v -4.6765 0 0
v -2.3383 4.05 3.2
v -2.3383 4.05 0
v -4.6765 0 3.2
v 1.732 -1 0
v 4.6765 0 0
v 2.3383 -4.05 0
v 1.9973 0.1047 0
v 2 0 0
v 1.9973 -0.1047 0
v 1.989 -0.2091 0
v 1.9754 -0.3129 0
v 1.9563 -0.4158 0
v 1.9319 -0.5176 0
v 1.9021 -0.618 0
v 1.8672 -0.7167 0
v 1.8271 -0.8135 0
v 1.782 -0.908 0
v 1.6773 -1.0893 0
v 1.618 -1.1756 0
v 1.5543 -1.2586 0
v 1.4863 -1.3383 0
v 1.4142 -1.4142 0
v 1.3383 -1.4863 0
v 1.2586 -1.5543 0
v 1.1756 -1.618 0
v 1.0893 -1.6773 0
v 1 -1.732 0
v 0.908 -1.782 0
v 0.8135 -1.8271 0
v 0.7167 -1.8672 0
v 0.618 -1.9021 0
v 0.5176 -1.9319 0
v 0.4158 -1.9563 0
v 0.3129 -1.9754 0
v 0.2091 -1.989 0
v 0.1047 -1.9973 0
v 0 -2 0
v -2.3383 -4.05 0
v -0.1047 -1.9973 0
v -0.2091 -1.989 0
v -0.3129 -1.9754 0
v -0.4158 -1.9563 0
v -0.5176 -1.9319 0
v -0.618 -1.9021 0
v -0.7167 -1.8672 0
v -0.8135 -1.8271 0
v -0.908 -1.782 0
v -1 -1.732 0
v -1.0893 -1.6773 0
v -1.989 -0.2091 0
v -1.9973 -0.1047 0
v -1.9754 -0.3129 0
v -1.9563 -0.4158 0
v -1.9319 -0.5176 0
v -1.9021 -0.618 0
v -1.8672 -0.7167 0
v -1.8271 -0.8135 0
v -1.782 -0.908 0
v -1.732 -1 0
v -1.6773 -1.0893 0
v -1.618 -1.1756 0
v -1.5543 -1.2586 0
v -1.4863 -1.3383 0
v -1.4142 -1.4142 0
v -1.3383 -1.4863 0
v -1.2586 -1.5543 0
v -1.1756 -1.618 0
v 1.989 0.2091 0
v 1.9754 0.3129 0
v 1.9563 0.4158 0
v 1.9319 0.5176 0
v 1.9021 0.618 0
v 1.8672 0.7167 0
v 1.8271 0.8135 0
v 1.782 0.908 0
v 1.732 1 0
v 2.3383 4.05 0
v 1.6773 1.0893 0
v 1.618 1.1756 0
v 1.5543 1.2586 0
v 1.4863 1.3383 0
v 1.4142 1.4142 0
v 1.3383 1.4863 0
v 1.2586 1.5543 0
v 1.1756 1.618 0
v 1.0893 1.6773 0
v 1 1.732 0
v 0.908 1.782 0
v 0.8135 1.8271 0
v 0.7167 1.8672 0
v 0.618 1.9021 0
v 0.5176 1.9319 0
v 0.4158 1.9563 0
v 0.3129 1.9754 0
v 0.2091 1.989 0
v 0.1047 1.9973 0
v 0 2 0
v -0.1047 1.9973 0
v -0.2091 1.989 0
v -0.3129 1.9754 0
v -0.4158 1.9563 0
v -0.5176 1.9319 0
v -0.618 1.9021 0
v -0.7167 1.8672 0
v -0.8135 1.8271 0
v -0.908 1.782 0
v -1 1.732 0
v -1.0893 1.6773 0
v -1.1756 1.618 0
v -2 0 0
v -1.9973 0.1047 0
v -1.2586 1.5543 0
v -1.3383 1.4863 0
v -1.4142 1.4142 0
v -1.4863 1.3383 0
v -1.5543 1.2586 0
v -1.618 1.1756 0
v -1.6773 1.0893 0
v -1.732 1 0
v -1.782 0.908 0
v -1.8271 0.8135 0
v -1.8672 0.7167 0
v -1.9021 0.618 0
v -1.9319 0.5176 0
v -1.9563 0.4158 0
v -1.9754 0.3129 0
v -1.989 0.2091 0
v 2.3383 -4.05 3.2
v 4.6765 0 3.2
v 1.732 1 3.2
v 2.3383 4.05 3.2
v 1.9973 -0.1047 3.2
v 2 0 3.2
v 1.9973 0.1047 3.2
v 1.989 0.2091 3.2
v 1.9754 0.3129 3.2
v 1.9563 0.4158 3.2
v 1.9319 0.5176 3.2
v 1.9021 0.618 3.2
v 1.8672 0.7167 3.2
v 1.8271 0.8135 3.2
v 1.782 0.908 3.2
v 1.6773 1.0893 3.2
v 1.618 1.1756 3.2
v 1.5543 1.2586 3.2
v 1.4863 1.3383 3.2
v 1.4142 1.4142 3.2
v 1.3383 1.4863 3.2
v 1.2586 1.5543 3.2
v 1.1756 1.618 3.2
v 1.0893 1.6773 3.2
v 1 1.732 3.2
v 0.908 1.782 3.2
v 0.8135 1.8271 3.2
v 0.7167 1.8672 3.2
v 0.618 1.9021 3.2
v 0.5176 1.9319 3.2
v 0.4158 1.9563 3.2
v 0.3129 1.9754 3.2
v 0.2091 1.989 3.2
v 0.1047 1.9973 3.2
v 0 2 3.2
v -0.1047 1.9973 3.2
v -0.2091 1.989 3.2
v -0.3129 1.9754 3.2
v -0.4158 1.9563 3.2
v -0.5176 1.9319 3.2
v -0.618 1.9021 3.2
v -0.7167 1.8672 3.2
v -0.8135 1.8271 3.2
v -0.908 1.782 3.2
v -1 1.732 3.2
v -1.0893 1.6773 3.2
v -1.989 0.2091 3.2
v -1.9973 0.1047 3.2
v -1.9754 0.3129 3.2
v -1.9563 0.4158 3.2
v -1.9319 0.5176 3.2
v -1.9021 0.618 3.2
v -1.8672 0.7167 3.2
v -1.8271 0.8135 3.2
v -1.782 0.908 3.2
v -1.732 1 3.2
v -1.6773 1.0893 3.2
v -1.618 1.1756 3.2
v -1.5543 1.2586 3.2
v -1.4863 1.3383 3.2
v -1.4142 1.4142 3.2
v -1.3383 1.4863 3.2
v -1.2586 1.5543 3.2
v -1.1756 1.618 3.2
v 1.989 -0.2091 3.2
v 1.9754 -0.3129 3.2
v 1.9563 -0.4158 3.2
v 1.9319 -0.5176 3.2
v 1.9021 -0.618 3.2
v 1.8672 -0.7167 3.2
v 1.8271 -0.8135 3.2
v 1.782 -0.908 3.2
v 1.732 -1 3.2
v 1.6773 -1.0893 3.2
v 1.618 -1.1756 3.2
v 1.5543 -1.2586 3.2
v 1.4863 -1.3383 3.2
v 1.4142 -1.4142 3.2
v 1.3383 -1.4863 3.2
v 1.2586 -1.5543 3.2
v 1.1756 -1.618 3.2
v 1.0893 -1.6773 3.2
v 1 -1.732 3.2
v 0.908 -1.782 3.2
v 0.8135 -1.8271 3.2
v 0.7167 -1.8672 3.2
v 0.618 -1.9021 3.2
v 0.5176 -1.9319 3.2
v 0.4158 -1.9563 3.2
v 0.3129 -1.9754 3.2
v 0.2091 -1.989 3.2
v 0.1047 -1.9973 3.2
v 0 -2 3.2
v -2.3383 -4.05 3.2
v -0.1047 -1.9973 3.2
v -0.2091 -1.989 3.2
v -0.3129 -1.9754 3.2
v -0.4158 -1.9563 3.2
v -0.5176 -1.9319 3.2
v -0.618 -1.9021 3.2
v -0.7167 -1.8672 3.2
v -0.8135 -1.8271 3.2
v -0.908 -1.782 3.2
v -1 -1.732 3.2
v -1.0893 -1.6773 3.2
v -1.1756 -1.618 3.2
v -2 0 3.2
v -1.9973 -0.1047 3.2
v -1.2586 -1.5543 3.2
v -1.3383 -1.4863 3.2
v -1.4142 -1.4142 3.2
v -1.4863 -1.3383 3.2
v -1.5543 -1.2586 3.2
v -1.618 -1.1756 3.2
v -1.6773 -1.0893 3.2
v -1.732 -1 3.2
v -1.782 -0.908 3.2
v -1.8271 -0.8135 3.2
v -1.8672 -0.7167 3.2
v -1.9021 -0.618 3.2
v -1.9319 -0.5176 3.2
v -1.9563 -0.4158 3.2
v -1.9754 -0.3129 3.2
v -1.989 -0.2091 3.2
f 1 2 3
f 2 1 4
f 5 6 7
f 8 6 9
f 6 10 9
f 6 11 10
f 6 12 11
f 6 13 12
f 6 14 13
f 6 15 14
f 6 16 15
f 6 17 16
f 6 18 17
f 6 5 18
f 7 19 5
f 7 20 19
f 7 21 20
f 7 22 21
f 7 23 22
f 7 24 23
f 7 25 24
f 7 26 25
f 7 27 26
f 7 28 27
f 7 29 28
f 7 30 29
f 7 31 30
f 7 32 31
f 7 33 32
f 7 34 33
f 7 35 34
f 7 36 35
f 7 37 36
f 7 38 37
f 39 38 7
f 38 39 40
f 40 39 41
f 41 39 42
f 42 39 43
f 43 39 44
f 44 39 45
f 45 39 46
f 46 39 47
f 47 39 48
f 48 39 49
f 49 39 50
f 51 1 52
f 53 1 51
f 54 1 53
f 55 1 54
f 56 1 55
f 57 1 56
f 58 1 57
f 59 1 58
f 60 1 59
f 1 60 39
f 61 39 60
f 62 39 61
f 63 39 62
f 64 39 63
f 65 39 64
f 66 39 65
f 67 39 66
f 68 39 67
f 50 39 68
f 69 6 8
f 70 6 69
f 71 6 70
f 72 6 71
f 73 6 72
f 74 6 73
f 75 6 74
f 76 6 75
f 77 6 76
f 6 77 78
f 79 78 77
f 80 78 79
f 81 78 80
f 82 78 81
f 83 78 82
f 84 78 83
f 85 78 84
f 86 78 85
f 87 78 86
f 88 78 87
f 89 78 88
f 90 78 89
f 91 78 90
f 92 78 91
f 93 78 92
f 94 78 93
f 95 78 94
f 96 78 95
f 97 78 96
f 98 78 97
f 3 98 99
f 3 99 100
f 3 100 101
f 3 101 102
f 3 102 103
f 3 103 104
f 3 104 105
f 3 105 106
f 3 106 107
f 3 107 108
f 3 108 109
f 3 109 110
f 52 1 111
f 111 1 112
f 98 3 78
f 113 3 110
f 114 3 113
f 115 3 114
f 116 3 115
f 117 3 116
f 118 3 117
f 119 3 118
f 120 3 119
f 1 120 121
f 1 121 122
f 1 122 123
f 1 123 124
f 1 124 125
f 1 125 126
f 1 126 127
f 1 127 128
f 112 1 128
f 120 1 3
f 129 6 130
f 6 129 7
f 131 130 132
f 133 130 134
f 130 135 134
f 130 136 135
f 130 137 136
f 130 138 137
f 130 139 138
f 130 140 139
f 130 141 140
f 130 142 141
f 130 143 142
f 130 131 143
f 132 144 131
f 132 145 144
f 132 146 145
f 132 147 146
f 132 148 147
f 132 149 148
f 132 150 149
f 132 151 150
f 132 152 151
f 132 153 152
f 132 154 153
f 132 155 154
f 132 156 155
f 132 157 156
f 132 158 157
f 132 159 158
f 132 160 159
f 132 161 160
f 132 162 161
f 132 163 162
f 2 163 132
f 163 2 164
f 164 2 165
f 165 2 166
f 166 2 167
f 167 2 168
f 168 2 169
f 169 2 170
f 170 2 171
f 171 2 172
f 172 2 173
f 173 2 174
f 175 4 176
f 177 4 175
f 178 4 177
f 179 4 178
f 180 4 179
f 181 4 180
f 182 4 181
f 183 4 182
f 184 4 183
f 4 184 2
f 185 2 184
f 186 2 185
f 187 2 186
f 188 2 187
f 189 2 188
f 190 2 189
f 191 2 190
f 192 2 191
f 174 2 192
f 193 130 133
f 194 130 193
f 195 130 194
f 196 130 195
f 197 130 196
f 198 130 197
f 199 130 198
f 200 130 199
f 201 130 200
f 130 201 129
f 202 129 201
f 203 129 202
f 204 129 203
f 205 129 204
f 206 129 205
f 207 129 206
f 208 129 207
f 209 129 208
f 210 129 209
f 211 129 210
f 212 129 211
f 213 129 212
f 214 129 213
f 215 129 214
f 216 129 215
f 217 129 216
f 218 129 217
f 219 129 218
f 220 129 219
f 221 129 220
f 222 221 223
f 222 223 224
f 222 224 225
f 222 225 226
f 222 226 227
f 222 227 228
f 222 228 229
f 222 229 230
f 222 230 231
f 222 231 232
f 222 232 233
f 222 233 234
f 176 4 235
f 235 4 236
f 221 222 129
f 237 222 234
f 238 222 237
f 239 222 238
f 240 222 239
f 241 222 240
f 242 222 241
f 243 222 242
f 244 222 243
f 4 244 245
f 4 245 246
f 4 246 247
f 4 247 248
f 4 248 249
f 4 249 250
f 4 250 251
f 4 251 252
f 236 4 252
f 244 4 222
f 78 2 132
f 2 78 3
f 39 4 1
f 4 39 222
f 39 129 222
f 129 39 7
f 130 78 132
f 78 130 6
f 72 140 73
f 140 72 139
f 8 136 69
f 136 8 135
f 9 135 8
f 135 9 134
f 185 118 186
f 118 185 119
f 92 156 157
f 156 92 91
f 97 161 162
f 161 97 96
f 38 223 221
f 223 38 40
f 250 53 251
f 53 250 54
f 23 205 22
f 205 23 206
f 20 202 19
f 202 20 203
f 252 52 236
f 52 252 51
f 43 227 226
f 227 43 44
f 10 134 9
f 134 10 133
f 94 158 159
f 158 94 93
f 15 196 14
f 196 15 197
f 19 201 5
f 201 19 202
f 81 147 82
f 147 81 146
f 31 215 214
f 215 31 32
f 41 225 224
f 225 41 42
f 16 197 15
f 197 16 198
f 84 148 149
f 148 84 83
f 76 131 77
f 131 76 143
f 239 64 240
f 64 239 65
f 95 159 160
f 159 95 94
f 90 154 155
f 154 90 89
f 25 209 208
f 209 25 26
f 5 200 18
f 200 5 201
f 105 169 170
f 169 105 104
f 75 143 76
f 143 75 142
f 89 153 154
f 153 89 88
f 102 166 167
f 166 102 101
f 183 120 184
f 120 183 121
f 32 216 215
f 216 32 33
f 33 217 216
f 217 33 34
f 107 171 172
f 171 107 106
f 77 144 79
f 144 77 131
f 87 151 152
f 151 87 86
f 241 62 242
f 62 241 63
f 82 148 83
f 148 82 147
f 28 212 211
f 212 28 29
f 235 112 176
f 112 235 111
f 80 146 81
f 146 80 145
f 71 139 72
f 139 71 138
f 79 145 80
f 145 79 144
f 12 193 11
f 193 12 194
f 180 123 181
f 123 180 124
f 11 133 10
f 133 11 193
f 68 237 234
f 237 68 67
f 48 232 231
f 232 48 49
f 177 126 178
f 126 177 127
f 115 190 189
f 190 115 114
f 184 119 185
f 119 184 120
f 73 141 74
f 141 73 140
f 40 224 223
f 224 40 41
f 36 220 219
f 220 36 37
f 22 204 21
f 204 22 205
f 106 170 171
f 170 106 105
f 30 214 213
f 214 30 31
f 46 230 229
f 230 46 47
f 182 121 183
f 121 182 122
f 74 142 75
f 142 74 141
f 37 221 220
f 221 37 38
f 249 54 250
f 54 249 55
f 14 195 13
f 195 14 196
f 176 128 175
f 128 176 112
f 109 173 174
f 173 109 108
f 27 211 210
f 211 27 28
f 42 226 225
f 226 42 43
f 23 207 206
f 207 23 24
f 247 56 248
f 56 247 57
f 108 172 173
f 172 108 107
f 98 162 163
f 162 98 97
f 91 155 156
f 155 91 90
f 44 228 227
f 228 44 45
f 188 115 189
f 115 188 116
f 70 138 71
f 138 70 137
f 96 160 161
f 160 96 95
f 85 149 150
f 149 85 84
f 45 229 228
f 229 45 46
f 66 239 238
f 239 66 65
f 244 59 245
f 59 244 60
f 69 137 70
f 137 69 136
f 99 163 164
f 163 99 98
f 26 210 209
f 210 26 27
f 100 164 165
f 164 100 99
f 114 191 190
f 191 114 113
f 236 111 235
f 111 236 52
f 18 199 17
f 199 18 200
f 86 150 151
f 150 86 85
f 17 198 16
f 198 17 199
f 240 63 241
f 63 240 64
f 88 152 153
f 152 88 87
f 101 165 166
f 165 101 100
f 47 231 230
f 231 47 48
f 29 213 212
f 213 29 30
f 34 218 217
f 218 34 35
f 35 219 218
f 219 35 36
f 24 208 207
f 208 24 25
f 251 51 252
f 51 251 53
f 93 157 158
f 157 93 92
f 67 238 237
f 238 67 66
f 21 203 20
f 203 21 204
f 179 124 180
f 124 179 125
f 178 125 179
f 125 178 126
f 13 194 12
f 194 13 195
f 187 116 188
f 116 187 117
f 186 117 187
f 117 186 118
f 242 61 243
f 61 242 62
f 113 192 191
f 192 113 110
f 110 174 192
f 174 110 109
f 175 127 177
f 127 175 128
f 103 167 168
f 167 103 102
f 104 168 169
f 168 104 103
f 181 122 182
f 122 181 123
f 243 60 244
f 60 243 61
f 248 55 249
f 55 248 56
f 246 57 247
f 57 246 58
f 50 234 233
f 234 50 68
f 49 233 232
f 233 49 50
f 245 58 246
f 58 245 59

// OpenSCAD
$fn = 120;

across_flats = 8.1;   // mm
thickness    = 3.2;   // mm
hole_d       = 4.0;   // mm (clearance as specified)

module hex_prism_af(af, h) {
    // For a regular hexagon: across_flats = 2 * apothem
    // Circumradius R = apothem / cos(30°) = (af/2) / cos(30°)
    R = (af/2) / cos(30);
    linear_extrude(height = h)
        polygon(points = [for (i = [0:5]) [R*cos(60*i), R*sin(60*i)]]);
}

difference() {
    hex_prism_af(across_flats, thickness);
    translate([0,0,-0.2])
        cylinder(d = hole_d, h = thickness + 0.4);
}
